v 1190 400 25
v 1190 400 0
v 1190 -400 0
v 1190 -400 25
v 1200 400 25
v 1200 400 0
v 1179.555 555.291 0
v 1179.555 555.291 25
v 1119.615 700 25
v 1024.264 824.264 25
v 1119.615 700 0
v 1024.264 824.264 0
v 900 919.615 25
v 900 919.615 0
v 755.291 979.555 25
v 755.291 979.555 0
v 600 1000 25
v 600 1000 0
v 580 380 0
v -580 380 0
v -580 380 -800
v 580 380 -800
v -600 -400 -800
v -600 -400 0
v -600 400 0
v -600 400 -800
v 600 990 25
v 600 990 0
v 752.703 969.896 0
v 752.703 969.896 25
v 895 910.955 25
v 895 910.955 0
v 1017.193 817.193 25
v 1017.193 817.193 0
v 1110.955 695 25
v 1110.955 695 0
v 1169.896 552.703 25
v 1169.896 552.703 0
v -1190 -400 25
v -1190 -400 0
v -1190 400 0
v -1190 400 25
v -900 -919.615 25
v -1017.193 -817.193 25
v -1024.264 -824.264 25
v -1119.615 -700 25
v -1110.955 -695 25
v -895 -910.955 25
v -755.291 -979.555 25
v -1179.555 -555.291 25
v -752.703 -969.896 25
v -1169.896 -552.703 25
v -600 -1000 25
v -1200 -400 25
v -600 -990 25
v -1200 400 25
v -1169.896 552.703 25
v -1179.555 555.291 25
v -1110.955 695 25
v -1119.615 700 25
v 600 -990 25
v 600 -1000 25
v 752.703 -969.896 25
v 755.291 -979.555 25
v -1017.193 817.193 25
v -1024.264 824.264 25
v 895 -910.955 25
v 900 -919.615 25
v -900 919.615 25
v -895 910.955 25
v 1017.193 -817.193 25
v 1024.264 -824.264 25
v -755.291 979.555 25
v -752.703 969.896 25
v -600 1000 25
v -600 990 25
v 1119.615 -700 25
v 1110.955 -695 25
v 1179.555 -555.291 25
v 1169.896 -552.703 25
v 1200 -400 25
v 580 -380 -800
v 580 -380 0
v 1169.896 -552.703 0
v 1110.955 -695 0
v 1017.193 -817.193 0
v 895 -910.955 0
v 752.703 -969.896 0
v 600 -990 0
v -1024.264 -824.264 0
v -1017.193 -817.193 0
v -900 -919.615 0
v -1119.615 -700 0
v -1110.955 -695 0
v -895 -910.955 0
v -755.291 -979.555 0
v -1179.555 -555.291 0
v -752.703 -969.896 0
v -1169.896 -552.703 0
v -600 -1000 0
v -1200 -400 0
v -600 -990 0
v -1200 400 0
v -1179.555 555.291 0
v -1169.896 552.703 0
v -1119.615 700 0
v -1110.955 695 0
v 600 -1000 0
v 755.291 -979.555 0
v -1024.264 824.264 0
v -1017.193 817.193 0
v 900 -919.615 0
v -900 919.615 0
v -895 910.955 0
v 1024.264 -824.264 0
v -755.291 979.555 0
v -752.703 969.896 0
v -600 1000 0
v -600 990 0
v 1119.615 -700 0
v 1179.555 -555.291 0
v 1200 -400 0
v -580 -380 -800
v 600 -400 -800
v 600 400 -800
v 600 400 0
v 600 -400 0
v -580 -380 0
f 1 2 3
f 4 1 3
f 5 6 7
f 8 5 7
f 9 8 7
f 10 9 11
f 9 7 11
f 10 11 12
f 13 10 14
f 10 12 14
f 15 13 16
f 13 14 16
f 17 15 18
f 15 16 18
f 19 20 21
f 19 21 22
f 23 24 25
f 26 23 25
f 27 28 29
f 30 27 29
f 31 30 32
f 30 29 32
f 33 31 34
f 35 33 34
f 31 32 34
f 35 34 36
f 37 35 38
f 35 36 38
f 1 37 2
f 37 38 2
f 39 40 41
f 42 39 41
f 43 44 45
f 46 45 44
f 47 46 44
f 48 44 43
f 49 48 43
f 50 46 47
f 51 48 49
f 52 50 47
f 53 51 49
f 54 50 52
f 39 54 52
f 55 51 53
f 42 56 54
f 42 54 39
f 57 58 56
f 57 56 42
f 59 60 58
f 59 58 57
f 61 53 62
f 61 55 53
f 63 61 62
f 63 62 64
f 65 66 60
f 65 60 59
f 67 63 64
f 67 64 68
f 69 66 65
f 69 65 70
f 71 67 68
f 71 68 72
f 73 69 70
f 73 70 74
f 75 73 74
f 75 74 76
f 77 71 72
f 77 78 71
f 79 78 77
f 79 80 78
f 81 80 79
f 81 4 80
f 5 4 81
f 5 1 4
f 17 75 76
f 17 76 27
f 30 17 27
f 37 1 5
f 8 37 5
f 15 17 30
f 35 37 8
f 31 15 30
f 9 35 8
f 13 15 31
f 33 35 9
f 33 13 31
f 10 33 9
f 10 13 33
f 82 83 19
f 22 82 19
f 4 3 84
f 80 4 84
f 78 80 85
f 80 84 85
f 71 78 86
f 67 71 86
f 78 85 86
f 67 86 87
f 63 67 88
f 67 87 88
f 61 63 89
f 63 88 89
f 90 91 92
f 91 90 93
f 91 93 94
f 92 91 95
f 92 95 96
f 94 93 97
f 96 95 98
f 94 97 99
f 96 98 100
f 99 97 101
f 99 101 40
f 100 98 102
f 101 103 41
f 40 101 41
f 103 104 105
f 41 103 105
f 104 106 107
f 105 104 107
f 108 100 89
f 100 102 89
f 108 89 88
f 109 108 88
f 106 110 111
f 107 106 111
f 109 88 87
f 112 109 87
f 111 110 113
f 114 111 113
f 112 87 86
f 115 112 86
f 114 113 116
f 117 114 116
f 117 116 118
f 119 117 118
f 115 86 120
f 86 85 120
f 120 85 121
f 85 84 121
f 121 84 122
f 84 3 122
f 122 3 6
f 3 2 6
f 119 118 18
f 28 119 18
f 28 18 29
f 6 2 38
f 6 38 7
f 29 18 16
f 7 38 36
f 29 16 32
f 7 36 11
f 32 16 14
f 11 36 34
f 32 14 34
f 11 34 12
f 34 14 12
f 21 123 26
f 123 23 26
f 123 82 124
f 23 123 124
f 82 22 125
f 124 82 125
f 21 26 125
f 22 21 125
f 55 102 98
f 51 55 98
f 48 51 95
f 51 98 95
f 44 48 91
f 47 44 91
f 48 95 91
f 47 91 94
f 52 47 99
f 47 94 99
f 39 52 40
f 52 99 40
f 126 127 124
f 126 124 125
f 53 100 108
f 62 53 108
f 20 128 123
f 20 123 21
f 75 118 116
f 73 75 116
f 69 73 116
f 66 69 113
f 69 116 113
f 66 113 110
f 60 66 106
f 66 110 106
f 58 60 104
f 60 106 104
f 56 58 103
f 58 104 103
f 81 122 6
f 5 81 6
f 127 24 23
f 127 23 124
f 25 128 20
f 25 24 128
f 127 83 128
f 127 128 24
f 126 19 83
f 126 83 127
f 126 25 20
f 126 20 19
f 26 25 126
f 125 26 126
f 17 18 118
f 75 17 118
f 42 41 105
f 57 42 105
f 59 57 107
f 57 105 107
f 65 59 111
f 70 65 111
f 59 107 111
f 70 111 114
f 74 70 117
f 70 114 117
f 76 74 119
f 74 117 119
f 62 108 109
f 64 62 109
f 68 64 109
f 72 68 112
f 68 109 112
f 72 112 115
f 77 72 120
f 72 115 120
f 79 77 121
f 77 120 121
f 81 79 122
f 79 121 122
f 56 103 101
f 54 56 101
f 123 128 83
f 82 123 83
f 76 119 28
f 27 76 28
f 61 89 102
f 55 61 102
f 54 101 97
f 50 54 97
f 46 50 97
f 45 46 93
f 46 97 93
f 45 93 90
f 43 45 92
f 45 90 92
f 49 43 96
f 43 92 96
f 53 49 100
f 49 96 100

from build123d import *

# Parameters (mm, degrees)
F1_W     = 1200
F1_H     = 800
F2_DEPTH = 800
F4_DEPTH = 25
F5_T     = -20


with BuildPart() as f2:
    # F1 (on face) → F2 (new body)
    with BuildSketch(Plane.XY):
        Rectangle(F1_W, F1_H)
    extrude(amount=-F2_DEPTH)

    # F5
    f5_openings = [f2.faces().sort_by_distance(p)[0] for p in [
        (0, 0, 0),
        (0, 0, -800),
    ]]
    offset(amount=F5_T, openings=f5_openings)


with BuildPart() as f4:
    # F3 (on face) → F4 (new body)
    with BuildSketch(Plane.XY):
        with BuildLine():
            Line((600, 1000), (-600, 1000))
            ThreePointArc((-600, 1000), (-1024.264069, 824.264069), (-1200, 400))
            Line((-1200, 400), (-1200, -400))
            ThreePointArc((-1200, -400), (-1024.264069, -824.264069), (-600, -1000))
            Line((-600, -1000), (600, -1000))
            ThreePointArc((600, -1000), (1024.264069, -824.264069), (1200, -400))
            Line((1200, -400), (1200, 400))
            ThreePointArc((1200, 400), (1024.264069, 824.264069), (600, 1000))
        make_face()
        with BuildLine():
            ThreePointArc((-600, -990), (-1017.193001, -817.193001), (-1190, -400))
            Line((-1190, -400), (-1190, 400))
            ThreePointArc((-1190, 400), (-1017.193001, 817.193001), (-600, 990))
            Line((-600, 990), (600, 990))
            ThreePointArc((600, 990), (1017.193001, 817.193001), (1190, 400))
            Line((1190, 400), (1190, -400))
            ThreePointArc((1190, -400), (1017.193001, -817.193001), (600, -990))
            Line((600, -990), (-600, -990))
        make_face(mode=Mode.SUBTRACT)
    extrude(amount=F4_DEPTH)


solid = Compound([f2.part, f4.part])
